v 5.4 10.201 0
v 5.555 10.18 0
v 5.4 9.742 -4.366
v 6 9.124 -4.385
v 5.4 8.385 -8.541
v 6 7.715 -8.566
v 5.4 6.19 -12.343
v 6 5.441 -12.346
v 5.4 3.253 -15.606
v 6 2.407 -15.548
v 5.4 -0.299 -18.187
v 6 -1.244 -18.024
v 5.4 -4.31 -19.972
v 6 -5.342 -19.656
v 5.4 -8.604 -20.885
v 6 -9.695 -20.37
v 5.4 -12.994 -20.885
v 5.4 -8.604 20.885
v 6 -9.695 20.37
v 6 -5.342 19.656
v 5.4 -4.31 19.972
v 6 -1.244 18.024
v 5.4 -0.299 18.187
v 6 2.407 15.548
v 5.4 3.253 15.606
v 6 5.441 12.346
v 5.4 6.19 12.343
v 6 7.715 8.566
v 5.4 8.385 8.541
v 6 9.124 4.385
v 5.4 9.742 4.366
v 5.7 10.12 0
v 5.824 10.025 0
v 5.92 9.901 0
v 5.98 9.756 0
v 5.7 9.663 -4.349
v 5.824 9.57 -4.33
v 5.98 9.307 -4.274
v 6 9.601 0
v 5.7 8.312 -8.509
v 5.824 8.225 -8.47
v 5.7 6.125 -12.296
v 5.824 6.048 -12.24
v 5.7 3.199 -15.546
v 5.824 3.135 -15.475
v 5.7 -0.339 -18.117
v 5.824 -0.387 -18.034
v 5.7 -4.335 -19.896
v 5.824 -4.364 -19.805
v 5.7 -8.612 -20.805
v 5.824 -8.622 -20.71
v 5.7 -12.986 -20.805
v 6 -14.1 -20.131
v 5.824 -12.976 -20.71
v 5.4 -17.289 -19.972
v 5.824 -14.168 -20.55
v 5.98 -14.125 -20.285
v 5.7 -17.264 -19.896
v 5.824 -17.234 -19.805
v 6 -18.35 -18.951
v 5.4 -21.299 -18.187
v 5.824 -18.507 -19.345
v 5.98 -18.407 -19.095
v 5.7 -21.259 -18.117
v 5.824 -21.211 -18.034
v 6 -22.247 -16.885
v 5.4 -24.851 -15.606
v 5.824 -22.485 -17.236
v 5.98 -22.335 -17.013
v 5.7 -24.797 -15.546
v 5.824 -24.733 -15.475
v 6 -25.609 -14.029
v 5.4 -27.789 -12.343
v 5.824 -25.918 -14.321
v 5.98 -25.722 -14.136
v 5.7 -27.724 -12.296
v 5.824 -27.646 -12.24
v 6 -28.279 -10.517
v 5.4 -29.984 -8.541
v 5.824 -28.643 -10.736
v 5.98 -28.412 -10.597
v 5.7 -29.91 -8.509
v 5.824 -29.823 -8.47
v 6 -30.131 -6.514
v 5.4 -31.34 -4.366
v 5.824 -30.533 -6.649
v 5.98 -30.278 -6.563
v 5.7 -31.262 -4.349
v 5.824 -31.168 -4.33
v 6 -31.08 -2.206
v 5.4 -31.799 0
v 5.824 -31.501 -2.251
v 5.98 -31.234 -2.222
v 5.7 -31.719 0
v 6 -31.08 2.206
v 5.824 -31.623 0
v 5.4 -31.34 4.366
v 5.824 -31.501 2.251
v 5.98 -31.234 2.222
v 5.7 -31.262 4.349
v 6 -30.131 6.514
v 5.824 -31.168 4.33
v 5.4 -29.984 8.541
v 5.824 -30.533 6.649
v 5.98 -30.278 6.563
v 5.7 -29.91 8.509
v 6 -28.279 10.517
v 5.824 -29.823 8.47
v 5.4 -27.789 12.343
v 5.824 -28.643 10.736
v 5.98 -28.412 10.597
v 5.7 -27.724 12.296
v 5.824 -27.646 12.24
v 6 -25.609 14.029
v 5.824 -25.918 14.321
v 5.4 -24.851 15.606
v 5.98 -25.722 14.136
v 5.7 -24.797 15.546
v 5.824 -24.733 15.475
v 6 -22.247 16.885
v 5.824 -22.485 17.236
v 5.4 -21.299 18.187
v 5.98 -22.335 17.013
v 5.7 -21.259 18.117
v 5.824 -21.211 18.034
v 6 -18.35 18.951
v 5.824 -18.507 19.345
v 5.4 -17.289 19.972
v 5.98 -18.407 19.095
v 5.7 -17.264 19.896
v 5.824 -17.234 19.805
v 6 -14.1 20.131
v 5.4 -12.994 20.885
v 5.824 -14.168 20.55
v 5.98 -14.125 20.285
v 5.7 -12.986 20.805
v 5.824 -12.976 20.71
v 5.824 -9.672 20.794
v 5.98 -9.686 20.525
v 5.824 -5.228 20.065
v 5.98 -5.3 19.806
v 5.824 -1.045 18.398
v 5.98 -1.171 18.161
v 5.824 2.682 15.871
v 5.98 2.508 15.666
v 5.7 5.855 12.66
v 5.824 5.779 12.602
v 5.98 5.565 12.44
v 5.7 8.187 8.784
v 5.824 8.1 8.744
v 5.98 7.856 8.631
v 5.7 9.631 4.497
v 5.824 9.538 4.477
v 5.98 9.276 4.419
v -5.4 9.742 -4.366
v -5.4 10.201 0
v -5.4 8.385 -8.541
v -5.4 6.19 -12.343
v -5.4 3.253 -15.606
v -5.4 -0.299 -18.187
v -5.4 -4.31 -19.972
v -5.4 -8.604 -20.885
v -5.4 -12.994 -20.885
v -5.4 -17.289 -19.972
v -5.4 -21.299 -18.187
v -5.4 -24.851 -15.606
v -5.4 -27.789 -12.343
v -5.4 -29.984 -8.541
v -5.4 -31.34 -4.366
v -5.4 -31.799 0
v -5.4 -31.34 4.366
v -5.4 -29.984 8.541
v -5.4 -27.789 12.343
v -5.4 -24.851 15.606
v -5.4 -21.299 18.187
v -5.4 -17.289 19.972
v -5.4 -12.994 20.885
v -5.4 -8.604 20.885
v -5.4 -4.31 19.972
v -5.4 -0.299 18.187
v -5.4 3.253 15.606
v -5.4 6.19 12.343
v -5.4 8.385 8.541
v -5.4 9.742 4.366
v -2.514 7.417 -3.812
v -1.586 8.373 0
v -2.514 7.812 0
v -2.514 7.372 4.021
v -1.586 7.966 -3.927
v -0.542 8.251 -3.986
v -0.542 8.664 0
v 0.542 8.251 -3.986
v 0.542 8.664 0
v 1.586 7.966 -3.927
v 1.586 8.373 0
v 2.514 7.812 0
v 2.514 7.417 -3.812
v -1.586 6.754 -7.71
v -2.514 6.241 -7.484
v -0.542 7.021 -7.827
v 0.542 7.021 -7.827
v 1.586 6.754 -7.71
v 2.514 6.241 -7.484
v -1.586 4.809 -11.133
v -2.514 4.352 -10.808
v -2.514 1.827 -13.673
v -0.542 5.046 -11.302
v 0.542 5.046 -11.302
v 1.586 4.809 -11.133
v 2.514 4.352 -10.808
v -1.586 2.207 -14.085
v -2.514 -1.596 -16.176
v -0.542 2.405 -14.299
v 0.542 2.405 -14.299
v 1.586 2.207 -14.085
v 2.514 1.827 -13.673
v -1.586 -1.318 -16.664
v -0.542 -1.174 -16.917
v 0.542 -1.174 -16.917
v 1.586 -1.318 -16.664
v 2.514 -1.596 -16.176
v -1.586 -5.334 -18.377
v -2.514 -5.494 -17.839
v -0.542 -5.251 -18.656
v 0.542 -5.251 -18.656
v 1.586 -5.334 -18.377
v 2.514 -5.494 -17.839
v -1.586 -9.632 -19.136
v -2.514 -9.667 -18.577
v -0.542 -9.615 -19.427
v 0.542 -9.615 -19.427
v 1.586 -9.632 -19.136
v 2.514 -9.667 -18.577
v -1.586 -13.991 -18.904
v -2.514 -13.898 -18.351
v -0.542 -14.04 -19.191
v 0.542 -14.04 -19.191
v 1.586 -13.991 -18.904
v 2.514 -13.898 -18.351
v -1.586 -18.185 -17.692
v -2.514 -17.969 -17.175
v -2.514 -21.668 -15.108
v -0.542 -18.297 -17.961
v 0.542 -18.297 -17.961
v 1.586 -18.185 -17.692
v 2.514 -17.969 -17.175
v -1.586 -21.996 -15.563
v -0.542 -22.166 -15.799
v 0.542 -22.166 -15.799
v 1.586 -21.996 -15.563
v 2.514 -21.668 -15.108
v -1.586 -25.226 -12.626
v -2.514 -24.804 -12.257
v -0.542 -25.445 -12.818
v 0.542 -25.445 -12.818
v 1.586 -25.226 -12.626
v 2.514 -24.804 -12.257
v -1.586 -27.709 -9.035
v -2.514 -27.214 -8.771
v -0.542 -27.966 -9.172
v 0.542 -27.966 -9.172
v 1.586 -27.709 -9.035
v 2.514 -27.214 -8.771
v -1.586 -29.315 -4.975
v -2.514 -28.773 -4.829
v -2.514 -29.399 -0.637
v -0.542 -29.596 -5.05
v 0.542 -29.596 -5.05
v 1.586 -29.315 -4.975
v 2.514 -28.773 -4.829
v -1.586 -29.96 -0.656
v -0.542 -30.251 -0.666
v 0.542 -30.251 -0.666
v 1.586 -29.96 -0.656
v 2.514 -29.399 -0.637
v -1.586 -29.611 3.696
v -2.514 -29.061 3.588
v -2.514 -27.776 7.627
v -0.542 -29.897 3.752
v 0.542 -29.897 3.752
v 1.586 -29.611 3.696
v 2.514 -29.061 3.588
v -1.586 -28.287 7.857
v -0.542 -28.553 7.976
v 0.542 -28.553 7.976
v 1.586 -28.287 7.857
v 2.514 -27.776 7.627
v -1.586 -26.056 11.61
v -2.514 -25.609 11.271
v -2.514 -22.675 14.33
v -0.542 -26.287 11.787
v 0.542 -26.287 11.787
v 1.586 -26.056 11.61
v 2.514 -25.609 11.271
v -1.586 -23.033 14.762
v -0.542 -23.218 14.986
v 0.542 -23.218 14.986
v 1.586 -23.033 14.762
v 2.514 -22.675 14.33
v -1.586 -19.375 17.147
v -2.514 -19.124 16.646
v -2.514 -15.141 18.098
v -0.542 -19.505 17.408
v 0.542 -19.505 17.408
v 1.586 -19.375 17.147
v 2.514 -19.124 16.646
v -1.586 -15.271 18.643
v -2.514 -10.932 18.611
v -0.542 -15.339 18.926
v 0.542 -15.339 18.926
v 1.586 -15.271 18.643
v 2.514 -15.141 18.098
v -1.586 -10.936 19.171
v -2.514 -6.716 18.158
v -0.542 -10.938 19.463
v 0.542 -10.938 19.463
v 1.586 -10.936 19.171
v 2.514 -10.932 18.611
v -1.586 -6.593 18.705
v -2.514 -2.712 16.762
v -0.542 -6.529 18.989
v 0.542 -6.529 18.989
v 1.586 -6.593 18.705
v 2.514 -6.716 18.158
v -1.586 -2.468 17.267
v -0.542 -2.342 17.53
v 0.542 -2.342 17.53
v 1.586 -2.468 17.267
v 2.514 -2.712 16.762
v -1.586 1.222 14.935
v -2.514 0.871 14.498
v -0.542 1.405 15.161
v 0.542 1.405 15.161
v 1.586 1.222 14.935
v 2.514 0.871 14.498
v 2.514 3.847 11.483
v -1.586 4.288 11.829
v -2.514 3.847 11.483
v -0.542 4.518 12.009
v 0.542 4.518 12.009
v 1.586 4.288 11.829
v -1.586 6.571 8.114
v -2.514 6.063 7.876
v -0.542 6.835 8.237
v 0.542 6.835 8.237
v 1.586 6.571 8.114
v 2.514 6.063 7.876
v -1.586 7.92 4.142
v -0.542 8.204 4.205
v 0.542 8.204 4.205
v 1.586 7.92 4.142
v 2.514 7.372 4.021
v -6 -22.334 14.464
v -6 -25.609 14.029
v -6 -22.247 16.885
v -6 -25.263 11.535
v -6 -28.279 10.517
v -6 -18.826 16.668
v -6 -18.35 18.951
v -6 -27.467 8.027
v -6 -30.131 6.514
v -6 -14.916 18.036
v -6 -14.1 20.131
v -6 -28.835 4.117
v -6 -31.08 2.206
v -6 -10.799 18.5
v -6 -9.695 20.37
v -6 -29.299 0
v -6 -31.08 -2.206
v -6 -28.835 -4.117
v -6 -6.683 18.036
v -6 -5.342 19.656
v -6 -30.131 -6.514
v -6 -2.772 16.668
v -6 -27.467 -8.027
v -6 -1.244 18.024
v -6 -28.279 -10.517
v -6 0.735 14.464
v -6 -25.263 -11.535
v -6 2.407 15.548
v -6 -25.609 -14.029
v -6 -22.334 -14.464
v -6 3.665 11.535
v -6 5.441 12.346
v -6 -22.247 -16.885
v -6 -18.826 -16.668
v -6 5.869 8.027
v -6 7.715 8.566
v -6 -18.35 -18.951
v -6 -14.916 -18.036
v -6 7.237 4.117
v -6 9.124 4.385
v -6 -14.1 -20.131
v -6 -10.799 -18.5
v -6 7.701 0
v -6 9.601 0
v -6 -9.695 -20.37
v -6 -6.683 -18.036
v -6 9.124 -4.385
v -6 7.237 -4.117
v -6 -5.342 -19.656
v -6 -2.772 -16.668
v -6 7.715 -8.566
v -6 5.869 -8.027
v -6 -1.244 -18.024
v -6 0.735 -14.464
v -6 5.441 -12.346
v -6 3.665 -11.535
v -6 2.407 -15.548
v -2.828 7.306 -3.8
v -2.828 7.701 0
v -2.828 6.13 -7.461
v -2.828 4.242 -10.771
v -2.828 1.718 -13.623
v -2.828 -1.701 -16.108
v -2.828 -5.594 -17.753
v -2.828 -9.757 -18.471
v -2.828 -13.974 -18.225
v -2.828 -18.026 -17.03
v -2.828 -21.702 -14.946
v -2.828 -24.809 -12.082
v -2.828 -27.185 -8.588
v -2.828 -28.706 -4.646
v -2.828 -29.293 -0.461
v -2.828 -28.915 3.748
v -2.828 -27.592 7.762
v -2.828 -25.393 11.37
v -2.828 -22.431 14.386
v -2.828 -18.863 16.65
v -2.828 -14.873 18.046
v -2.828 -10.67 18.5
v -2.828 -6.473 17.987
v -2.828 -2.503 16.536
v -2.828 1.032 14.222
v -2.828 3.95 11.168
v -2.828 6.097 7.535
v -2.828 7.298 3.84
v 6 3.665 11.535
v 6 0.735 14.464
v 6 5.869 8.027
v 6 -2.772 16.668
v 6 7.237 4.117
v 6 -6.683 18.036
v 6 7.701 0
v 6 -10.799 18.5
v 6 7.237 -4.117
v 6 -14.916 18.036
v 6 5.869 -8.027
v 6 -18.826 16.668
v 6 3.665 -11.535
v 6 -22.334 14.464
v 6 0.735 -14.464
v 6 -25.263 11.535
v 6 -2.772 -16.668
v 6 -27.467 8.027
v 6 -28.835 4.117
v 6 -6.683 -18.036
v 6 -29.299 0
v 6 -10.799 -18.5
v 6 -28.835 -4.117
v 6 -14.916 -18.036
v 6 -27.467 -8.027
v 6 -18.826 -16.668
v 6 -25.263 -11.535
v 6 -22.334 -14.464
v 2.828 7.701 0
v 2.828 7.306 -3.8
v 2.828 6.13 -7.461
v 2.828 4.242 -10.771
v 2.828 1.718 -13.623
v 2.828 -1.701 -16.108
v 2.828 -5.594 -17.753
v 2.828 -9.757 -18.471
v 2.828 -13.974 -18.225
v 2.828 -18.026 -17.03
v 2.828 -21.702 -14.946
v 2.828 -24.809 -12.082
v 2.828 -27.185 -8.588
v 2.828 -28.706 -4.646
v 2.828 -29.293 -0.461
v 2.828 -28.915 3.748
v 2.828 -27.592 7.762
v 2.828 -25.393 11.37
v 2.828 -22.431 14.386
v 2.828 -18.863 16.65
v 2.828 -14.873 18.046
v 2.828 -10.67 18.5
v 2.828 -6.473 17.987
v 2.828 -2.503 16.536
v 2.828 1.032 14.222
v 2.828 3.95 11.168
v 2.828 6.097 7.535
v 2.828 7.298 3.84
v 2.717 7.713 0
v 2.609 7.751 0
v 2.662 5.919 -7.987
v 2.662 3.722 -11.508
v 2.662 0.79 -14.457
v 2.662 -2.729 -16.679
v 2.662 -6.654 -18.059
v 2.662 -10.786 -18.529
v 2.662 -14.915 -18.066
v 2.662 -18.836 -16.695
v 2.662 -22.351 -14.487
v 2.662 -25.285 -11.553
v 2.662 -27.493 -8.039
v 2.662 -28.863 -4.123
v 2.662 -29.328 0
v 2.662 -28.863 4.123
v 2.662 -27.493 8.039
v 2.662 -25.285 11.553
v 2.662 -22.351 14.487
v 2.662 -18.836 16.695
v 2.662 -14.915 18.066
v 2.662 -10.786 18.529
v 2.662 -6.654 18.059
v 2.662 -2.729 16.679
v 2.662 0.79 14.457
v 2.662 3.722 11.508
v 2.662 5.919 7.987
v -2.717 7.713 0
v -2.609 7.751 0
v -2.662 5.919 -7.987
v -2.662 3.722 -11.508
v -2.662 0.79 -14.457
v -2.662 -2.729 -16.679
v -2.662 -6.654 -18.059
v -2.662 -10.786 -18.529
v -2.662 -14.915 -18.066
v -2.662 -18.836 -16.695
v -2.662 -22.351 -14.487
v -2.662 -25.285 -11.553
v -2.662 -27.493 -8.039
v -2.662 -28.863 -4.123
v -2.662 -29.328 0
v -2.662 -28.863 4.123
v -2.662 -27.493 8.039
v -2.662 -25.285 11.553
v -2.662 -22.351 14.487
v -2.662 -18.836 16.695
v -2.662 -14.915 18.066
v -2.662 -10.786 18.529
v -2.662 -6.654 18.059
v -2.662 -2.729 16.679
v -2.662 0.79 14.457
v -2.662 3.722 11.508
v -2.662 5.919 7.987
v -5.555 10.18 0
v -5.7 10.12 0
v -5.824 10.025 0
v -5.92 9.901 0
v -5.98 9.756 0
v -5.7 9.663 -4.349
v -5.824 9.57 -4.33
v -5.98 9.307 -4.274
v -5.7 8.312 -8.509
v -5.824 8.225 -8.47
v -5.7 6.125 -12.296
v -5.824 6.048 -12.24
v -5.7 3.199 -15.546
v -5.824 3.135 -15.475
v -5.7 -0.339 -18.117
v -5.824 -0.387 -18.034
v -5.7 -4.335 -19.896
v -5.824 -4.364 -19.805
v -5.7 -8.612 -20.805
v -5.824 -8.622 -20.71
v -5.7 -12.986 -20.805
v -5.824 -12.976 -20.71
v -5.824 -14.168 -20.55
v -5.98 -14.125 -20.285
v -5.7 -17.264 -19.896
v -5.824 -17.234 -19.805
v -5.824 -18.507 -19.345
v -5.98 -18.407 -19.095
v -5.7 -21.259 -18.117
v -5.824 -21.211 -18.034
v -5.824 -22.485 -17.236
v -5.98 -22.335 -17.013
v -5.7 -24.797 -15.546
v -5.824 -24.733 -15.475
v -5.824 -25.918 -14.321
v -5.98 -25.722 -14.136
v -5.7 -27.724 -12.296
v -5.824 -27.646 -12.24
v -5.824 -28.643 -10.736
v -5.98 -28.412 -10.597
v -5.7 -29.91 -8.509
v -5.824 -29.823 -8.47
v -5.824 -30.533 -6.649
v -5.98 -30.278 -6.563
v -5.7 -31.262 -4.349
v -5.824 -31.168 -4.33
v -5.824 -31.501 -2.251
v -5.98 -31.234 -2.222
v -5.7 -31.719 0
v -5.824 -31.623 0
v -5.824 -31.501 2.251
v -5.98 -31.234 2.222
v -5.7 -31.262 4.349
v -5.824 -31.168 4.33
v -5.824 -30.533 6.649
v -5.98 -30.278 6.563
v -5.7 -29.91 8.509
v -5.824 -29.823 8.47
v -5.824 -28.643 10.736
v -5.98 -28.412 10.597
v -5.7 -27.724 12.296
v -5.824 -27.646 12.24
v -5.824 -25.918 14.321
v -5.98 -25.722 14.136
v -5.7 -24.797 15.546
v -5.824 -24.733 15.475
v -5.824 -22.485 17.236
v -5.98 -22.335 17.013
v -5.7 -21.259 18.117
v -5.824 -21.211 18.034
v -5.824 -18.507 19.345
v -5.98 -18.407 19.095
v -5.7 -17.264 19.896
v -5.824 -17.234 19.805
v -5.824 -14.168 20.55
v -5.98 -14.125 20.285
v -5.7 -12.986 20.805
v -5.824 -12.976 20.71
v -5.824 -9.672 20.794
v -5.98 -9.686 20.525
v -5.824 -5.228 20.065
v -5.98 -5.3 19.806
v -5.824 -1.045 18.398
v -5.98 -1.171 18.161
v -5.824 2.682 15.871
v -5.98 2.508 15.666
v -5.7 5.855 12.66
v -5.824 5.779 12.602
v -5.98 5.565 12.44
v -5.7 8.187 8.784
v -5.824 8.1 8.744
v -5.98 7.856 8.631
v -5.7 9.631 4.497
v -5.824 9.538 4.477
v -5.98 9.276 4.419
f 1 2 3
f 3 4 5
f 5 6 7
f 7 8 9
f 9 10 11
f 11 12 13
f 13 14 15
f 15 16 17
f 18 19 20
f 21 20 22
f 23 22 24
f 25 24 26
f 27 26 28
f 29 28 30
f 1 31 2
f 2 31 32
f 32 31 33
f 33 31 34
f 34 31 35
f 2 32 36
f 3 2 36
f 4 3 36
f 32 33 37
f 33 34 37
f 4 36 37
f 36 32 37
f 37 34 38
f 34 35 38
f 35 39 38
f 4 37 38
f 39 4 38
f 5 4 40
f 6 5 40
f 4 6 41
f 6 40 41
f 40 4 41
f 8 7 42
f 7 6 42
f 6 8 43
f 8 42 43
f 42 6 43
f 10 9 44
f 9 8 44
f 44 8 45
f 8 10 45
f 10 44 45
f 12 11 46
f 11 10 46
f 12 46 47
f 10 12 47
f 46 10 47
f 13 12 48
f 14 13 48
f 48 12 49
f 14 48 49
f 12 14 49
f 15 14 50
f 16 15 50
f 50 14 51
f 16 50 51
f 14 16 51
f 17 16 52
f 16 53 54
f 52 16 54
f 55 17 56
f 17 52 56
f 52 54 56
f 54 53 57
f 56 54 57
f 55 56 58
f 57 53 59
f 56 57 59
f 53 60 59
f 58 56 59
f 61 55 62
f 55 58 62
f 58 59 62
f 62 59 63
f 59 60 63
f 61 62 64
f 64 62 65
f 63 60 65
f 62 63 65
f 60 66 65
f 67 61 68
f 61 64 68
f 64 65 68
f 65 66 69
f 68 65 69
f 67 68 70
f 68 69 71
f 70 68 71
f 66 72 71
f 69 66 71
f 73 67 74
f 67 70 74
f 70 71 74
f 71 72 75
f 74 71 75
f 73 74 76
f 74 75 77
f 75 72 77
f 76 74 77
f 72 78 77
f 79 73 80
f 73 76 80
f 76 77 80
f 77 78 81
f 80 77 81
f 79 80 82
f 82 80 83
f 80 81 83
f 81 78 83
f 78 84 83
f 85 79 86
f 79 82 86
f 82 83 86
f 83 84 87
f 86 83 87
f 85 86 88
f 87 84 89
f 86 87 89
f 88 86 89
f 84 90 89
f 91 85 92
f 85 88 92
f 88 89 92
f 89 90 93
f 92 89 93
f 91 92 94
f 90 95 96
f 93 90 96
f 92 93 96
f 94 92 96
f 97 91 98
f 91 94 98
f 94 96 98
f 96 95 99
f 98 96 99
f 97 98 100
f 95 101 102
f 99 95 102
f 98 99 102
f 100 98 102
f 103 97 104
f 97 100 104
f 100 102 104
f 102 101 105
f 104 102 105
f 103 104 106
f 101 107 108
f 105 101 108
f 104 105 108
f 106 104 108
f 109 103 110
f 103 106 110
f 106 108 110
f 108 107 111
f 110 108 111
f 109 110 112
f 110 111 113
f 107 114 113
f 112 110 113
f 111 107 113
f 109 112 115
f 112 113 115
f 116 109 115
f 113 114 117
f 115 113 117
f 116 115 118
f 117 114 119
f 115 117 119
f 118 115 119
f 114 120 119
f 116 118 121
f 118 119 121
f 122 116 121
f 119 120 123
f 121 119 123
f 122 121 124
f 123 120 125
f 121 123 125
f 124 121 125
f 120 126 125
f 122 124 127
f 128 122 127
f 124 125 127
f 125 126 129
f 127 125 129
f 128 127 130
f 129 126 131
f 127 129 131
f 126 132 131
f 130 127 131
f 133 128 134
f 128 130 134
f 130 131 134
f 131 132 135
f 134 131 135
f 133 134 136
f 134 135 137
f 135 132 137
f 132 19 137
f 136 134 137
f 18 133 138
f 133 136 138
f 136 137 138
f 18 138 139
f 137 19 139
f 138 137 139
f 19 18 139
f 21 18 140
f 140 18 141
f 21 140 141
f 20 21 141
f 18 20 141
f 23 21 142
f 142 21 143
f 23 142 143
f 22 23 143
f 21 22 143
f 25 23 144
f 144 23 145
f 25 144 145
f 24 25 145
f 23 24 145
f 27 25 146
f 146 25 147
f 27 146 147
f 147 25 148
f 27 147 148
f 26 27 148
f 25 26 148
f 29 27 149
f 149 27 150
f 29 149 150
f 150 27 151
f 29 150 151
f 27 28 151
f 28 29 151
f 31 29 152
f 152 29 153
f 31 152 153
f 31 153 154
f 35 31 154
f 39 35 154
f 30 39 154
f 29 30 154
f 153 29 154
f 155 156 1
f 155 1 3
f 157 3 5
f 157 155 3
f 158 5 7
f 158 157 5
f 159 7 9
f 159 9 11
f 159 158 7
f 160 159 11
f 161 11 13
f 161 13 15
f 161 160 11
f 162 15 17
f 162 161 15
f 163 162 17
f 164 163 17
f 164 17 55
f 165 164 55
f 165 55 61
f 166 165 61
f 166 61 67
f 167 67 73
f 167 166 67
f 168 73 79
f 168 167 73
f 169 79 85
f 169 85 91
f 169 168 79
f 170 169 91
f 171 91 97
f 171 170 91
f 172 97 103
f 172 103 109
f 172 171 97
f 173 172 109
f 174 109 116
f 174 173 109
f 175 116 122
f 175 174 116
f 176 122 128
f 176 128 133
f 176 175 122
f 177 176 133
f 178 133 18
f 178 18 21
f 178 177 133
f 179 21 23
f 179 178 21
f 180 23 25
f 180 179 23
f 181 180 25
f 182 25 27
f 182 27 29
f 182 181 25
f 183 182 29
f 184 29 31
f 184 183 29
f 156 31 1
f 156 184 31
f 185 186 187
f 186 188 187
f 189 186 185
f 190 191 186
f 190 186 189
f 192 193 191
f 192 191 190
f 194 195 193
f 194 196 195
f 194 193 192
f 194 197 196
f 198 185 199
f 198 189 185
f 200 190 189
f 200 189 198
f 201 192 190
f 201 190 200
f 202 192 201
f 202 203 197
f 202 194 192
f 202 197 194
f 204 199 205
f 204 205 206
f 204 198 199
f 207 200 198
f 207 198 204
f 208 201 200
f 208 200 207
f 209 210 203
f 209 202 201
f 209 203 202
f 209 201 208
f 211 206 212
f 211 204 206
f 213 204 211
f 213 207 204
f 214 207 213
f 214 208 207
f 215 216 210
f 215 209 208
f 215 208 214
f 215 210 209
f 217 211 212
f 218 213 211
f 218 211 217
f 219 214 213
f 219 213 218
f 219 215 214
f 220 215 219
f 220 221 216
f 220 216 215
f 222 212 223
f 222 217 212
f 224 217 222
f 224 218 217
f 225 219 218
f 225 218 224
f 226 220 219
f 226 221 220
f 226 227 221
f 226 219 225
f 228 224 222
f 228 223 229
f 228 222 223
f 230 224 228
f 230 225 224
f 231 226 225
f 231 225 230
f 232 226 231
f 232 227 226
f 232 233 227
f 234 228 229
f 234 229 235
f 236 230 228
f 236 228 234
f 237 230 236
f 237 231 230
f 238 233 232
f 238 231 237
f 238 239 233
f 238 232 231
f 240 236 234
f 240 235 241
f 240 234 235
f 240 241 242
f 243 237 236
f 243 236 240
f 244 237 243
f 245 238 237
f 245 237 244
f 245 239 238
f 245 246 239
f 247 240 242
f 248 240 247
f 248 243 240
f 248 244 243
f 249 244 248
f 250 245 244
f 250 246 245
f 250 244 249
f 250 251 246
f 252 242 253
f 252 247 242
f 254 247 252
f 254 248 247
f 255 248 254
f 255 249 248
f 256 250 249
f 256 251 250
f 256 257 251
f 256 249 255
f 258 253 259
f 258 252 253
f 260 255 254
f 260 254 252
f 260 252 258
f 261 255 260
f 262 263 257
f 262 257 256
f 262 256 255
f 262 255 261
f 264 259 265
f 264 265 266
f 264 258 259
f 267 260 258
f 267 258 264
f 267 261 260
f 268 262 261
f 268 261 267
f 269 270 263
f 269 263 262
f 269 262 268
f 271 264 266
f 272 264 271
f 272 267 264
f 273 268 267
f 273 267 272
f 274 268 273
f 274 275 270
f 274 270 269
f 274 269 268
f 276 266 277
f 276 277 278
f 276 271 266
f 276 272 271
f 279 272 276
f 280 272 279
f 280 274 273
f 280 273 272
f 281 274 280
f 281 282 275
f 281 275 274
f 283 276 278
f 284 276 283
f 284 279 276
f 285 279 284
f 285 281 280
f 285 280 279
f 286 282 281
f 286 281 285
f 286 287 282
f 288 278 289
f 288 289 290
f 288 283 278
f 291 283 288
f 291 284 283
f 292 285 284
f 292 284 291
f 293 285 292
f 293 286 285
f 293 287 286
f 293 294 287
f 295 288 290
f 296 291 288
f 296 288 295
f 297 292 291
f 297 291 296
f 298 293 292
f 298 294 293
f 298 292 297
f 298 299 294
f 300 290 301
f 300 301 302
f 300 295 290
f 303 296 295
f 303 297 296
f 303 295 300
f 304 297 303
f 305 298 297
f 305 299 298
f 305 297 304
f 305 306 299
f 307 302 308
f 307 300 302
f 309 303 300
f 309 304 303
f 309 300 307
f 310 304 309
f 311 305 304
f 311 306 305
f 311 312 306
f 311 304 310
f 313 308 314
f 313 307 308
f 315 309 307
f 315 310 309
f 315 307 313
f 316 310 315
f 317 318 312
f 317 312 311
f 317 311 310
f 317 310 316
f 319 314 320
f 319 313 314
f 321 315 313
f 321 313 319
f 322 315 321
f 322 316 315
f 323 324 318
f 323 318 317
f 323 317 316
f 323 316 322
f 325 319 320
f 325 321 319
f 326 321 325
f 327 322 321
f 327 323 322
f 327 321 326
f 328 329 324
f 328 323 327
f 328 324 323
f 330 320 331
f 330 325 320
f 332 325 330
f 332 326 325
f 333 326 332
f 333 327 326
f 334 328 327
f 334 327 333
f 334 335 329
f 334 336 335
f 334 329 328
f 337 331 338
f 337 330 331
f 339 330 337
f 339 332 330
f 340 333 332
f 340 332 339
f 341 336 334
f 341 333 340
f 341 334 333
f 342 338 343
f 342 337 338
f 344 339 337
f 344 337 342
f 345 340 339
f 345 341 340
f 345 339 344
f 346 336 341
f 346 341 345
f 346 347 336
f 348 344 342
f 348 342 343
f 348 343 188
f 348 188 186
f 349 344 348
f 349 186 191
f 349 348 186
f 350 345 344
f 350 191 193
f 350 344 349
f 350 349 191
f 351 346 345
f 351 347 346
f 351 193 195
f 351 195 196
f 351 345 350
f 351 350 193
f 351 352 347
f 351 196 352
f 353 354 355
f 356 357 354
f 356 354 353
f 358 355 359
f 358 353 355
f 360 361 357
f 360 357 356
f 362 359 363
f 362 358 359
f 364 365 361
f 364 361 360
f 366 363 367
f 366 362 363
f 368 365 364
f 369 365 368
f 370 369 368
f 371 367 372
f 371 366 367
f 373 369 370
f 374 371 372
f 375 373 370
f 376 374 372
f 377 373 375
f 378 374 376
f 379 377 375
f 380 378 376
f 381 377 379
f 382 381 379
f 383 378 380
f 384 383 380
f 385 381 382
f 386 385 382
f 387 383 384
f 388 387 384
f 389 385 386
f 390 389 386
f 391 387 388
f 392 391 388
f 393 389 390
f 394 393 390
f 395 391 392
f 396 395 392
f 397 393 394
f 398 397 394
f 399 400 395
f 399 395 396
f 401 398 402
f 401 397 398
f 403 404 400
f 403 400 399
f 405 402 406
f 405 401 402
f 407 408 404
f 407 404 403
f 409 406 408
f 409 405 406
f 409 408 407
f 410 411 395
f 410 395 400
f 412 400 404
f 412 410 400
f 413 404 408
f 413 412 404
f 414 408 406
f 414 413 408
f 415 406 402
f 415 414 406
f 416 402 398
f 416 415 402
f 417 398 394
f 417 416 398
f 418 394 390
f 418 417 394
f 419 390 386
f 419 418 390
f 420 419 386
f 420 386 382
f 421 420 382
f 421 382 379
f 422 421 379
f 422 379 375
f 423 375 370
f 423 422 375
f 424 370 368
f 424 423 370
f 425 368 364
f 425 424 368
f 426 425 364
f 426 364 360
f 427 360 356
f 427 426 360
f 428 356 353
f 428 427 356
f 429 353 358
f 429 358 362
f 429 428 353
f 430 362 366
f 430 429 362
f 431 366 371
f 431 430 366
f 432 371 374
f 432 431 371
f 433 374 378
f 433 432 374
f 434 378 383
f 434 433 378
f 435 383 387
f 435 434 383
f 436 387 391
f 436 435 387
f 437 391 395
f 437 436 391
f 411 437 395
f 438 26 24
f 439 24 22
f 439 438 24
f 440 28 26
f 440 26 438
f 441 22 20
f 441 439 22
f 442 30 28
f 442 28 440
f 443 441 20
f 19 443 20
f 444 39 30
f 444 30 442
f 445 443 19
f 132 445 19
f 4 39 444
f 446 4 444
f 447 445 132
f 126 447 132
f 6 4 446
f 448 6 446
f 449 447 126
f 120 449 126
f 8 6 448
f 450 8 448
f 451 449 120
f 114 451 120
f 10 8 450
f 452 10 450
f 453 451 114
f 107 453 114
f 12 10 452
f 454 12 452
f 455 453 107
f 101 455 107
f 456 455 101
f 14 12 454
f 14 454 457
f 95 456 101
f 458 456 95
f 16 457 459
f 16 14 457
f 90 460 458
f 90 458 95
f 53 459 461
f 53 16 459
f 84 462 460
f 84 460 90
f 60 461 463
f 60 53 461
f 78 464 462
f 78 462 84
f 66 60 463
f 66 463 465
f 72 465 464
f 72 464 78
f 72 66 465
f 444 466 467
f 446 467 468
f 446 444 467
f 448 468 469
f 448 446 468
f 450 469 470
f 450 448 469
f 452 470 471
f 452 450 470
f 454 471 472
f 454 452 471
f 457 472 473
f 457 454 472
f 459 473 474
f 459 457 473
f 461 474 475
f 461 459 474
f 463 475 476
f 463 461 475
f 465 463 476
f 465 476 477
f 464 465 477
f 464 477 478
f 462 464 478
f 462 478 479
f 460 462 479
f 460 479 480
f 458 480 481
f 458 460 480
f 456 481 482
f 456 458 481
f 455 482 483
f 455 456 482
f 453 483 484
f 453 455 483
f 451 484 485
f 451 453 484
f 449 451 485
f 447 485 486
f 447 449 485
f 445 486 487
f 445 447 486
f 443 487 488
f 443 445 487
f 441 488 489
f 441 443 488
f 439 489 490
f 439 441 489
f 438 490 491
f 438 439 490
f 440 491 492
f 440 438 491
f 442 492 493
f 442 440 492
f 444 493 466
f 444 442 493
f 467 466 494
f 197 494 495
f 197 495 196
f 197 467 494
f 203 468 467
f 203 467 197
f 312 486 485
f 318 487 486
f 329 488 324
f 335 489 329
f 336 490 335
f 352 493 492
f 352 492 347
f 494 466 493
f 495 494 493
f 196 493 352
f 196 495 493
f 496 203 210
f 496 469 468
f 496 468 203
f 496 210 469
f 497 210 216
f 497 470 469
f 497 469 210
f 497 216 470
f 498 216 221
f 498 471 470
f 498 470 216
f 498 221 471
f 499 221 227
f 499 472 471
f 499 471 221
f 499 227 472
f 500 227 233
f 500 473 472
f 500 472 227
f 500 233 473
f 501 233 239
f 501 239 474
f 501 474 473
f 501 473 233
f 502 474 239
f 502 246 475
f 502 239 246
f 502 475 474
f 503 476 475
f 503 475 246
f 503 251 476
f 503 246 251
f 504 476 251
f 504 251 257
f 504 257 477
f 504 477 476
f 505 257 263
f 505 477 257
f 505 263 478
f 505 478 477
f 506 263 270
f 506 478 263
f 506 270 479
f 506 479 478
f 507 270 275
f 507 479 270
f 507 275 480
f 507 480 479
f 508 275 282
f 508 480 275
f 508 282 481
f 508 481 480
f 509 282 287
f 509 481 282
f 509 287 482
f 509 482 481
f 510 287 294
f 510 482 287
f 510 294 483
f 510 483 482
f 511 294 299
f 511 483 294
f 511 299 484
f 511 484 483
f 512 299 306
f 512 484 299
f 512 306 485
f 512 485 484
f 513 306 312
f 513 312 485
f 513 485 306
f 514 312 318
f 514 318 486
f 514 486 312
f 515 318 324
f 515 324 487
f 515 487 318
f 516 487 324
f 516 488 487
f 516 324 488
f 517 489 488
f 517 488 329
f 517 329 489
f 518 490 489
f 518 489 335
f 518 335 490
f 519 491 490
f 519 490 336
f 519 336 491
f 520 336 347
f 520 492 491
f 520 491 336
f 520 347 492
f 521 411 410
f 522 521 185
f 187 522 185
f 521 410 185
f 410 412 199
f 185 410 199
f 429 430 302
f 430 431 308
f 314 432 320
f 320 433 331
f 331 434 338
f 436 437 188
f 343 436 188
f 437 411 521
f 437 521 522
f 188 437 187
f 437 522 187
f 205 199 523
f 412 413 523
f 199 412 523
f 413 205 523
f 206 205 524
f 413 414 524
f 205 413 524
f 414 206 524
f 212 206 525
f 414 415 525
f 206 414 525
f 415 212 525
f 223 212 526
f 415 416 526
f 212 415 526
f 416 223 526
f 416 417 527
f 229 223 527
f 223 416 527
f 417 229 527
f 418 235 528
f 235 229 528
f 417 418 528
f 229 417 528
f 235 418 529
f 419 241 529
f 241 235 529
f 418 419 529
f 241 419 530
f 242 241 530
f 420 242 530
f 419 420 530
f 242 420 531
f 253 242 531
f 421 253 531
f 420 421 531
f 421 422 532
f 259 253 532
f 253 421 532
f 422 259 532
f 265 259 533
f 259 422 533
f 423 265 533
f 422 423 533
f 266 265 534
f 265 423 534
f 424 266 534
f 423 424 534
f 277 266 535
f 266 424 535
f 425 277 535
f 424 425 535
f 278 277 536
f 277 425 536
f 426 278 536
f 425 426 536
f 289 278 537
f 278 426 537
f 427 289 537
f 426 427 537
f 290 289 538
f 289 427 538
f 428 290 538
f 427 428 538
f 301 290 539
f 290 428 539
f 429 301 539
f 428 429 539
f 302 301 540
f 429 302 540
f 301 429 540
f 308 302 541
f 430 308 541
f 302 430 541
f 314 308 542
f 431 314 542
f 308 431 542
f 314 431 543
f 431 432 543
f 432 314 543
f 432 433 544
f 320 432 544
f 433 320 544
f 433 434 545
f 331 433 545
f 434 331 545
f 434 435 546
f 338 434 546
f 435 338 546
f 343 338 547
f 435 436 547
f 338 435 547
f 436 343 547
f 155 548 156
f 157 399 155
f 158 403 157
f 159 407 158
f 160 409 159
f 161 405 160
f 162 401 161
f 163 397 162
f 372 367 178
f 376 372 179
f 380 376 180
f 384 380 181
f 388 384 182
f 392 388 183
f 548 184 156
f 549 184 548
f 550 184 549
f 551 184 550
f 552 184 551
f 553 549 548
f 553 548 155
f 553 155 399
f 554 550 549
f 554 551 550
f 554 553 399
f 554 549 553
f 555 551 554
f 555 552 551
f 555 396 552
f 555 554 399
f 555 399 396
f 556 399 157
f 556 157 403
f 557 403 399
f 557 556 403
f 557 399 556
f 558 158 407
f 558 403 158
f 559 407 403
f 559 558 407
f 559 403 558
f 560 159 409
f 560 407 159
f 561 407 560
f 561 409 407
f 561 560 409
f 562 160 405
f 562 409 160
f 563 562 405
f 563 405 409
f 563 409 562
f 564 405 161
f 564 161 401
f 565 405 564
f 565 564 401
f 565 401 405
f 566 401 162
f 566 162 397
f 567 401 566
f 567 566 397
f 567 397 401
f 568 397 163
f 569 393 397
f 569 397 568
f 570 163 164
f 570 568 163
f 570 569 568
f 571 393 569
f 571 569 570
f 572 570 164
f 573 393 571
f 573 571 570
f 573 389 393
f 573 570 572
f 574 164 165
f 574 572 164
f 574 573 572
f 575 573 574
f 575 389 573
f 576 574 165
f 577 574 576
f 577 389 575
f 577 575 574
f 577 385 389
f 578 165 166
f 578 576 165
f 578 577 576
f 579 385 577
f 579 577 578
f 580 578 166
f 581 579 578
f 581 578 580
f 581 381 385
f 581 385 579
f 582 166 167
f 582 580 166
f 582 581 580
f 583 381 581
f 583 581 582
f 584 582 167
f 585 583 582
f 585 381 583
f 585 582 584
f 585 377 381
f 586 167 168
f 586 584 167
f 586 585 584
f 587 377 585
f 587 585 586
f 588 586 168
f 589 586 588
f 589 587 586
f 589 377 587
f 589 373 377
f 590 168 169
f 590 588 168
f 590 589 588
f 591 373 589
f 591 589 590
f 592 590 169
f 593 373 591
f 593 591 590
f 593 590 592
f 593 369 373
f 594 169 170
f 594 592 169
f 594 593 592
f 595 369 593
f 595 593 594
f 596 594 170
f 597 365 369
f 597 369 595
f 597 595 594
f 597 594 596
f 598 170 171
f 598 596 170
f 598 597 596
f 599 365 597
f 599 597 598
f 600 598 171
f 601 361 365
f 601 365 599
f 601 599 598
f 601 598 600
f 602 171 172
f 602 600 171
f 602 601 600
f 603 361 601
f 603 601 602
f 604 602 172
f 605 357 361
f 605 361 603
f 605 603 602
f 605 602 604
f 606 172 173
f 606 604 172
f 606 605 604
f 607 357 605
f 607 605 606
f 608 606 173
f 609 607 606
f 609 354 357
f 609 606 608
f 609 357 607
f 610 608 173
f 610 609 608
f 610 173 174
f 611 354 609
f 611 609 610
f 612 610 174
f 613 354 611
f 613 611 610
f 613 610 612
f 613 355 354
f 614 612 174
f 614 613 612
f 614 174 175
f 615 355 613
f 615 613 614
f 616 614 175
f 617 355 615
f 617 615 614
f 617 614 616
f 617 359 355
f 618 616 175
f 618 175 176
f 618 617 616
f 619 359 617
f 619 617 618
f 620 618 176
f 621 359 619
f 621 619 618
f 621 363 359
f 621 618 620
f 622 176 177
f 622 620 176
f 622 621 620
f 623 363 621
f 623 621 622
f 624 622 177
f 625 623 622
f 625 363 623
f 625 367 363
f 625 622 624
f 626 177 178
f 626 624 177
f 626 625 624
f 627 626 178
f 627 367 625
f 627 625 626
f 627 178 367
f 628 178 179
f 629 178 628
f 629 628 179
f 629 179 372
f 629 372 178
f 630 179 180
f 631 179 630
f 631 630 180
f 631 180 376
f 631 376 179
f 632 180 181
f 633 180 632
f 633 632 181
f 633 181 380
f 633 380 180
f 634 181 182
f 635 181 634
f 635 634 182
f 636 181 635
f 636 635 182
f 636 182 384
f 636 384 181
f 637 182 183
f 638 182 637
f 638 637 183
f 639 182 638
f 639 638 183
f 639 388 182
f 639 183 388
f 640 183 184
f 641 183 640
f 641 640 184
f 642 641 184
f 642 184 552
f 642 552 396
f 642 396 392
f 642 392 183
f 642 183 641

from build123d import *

# Parameters (mm, degrees)
FILLET2_R = 0.6
FILLET3_R = 0.5


with BuildPart() as part:
    # Sketch1 → Revolve1 (revolve)
    with BuildSketch(Plane.XY):
        with BuildLine():
            Line((6, 10.200814883), (-6, 10.200814883))
            Line((-6, 10.200814883), (-6, 7.700814883))
            Line((-6, 7.700814883), (-2.645751311, 7.700814883))
            ThreePointArc((-2.645751311, 7.700814883), (0, 8.700814883), (2.645751311, 7.700814883))
            Line((2.645751311, 7.700814883), (6, 7.700814883))
            Line((6, 7.700814883), (6, 10.200814883))
        make_face()
    revolve(axis=Axis((44.126443973, -10.799185117, 0), (-1, 0, 0)))

    # Fillet2
    fillet2_edges = [part.edges().sort_by_distance(p)[0] for p in [
        (-6, -31.799185117, 0),
        (6, -31.799185117, 0),
    ]]
    fillet(fillet2_edges, radius=FILLET2_R)

    # Fillet3
    fillet3_edges = [part.edges().sort_by_distance(p)[0] for p in [
        (-2.645751311, -29.299185117, 0),
        (2.645751311, -29.299185117, 0),
    ]]
    fillet(fillet3_edges, radius=FILLET3_R)


solid = part.part
